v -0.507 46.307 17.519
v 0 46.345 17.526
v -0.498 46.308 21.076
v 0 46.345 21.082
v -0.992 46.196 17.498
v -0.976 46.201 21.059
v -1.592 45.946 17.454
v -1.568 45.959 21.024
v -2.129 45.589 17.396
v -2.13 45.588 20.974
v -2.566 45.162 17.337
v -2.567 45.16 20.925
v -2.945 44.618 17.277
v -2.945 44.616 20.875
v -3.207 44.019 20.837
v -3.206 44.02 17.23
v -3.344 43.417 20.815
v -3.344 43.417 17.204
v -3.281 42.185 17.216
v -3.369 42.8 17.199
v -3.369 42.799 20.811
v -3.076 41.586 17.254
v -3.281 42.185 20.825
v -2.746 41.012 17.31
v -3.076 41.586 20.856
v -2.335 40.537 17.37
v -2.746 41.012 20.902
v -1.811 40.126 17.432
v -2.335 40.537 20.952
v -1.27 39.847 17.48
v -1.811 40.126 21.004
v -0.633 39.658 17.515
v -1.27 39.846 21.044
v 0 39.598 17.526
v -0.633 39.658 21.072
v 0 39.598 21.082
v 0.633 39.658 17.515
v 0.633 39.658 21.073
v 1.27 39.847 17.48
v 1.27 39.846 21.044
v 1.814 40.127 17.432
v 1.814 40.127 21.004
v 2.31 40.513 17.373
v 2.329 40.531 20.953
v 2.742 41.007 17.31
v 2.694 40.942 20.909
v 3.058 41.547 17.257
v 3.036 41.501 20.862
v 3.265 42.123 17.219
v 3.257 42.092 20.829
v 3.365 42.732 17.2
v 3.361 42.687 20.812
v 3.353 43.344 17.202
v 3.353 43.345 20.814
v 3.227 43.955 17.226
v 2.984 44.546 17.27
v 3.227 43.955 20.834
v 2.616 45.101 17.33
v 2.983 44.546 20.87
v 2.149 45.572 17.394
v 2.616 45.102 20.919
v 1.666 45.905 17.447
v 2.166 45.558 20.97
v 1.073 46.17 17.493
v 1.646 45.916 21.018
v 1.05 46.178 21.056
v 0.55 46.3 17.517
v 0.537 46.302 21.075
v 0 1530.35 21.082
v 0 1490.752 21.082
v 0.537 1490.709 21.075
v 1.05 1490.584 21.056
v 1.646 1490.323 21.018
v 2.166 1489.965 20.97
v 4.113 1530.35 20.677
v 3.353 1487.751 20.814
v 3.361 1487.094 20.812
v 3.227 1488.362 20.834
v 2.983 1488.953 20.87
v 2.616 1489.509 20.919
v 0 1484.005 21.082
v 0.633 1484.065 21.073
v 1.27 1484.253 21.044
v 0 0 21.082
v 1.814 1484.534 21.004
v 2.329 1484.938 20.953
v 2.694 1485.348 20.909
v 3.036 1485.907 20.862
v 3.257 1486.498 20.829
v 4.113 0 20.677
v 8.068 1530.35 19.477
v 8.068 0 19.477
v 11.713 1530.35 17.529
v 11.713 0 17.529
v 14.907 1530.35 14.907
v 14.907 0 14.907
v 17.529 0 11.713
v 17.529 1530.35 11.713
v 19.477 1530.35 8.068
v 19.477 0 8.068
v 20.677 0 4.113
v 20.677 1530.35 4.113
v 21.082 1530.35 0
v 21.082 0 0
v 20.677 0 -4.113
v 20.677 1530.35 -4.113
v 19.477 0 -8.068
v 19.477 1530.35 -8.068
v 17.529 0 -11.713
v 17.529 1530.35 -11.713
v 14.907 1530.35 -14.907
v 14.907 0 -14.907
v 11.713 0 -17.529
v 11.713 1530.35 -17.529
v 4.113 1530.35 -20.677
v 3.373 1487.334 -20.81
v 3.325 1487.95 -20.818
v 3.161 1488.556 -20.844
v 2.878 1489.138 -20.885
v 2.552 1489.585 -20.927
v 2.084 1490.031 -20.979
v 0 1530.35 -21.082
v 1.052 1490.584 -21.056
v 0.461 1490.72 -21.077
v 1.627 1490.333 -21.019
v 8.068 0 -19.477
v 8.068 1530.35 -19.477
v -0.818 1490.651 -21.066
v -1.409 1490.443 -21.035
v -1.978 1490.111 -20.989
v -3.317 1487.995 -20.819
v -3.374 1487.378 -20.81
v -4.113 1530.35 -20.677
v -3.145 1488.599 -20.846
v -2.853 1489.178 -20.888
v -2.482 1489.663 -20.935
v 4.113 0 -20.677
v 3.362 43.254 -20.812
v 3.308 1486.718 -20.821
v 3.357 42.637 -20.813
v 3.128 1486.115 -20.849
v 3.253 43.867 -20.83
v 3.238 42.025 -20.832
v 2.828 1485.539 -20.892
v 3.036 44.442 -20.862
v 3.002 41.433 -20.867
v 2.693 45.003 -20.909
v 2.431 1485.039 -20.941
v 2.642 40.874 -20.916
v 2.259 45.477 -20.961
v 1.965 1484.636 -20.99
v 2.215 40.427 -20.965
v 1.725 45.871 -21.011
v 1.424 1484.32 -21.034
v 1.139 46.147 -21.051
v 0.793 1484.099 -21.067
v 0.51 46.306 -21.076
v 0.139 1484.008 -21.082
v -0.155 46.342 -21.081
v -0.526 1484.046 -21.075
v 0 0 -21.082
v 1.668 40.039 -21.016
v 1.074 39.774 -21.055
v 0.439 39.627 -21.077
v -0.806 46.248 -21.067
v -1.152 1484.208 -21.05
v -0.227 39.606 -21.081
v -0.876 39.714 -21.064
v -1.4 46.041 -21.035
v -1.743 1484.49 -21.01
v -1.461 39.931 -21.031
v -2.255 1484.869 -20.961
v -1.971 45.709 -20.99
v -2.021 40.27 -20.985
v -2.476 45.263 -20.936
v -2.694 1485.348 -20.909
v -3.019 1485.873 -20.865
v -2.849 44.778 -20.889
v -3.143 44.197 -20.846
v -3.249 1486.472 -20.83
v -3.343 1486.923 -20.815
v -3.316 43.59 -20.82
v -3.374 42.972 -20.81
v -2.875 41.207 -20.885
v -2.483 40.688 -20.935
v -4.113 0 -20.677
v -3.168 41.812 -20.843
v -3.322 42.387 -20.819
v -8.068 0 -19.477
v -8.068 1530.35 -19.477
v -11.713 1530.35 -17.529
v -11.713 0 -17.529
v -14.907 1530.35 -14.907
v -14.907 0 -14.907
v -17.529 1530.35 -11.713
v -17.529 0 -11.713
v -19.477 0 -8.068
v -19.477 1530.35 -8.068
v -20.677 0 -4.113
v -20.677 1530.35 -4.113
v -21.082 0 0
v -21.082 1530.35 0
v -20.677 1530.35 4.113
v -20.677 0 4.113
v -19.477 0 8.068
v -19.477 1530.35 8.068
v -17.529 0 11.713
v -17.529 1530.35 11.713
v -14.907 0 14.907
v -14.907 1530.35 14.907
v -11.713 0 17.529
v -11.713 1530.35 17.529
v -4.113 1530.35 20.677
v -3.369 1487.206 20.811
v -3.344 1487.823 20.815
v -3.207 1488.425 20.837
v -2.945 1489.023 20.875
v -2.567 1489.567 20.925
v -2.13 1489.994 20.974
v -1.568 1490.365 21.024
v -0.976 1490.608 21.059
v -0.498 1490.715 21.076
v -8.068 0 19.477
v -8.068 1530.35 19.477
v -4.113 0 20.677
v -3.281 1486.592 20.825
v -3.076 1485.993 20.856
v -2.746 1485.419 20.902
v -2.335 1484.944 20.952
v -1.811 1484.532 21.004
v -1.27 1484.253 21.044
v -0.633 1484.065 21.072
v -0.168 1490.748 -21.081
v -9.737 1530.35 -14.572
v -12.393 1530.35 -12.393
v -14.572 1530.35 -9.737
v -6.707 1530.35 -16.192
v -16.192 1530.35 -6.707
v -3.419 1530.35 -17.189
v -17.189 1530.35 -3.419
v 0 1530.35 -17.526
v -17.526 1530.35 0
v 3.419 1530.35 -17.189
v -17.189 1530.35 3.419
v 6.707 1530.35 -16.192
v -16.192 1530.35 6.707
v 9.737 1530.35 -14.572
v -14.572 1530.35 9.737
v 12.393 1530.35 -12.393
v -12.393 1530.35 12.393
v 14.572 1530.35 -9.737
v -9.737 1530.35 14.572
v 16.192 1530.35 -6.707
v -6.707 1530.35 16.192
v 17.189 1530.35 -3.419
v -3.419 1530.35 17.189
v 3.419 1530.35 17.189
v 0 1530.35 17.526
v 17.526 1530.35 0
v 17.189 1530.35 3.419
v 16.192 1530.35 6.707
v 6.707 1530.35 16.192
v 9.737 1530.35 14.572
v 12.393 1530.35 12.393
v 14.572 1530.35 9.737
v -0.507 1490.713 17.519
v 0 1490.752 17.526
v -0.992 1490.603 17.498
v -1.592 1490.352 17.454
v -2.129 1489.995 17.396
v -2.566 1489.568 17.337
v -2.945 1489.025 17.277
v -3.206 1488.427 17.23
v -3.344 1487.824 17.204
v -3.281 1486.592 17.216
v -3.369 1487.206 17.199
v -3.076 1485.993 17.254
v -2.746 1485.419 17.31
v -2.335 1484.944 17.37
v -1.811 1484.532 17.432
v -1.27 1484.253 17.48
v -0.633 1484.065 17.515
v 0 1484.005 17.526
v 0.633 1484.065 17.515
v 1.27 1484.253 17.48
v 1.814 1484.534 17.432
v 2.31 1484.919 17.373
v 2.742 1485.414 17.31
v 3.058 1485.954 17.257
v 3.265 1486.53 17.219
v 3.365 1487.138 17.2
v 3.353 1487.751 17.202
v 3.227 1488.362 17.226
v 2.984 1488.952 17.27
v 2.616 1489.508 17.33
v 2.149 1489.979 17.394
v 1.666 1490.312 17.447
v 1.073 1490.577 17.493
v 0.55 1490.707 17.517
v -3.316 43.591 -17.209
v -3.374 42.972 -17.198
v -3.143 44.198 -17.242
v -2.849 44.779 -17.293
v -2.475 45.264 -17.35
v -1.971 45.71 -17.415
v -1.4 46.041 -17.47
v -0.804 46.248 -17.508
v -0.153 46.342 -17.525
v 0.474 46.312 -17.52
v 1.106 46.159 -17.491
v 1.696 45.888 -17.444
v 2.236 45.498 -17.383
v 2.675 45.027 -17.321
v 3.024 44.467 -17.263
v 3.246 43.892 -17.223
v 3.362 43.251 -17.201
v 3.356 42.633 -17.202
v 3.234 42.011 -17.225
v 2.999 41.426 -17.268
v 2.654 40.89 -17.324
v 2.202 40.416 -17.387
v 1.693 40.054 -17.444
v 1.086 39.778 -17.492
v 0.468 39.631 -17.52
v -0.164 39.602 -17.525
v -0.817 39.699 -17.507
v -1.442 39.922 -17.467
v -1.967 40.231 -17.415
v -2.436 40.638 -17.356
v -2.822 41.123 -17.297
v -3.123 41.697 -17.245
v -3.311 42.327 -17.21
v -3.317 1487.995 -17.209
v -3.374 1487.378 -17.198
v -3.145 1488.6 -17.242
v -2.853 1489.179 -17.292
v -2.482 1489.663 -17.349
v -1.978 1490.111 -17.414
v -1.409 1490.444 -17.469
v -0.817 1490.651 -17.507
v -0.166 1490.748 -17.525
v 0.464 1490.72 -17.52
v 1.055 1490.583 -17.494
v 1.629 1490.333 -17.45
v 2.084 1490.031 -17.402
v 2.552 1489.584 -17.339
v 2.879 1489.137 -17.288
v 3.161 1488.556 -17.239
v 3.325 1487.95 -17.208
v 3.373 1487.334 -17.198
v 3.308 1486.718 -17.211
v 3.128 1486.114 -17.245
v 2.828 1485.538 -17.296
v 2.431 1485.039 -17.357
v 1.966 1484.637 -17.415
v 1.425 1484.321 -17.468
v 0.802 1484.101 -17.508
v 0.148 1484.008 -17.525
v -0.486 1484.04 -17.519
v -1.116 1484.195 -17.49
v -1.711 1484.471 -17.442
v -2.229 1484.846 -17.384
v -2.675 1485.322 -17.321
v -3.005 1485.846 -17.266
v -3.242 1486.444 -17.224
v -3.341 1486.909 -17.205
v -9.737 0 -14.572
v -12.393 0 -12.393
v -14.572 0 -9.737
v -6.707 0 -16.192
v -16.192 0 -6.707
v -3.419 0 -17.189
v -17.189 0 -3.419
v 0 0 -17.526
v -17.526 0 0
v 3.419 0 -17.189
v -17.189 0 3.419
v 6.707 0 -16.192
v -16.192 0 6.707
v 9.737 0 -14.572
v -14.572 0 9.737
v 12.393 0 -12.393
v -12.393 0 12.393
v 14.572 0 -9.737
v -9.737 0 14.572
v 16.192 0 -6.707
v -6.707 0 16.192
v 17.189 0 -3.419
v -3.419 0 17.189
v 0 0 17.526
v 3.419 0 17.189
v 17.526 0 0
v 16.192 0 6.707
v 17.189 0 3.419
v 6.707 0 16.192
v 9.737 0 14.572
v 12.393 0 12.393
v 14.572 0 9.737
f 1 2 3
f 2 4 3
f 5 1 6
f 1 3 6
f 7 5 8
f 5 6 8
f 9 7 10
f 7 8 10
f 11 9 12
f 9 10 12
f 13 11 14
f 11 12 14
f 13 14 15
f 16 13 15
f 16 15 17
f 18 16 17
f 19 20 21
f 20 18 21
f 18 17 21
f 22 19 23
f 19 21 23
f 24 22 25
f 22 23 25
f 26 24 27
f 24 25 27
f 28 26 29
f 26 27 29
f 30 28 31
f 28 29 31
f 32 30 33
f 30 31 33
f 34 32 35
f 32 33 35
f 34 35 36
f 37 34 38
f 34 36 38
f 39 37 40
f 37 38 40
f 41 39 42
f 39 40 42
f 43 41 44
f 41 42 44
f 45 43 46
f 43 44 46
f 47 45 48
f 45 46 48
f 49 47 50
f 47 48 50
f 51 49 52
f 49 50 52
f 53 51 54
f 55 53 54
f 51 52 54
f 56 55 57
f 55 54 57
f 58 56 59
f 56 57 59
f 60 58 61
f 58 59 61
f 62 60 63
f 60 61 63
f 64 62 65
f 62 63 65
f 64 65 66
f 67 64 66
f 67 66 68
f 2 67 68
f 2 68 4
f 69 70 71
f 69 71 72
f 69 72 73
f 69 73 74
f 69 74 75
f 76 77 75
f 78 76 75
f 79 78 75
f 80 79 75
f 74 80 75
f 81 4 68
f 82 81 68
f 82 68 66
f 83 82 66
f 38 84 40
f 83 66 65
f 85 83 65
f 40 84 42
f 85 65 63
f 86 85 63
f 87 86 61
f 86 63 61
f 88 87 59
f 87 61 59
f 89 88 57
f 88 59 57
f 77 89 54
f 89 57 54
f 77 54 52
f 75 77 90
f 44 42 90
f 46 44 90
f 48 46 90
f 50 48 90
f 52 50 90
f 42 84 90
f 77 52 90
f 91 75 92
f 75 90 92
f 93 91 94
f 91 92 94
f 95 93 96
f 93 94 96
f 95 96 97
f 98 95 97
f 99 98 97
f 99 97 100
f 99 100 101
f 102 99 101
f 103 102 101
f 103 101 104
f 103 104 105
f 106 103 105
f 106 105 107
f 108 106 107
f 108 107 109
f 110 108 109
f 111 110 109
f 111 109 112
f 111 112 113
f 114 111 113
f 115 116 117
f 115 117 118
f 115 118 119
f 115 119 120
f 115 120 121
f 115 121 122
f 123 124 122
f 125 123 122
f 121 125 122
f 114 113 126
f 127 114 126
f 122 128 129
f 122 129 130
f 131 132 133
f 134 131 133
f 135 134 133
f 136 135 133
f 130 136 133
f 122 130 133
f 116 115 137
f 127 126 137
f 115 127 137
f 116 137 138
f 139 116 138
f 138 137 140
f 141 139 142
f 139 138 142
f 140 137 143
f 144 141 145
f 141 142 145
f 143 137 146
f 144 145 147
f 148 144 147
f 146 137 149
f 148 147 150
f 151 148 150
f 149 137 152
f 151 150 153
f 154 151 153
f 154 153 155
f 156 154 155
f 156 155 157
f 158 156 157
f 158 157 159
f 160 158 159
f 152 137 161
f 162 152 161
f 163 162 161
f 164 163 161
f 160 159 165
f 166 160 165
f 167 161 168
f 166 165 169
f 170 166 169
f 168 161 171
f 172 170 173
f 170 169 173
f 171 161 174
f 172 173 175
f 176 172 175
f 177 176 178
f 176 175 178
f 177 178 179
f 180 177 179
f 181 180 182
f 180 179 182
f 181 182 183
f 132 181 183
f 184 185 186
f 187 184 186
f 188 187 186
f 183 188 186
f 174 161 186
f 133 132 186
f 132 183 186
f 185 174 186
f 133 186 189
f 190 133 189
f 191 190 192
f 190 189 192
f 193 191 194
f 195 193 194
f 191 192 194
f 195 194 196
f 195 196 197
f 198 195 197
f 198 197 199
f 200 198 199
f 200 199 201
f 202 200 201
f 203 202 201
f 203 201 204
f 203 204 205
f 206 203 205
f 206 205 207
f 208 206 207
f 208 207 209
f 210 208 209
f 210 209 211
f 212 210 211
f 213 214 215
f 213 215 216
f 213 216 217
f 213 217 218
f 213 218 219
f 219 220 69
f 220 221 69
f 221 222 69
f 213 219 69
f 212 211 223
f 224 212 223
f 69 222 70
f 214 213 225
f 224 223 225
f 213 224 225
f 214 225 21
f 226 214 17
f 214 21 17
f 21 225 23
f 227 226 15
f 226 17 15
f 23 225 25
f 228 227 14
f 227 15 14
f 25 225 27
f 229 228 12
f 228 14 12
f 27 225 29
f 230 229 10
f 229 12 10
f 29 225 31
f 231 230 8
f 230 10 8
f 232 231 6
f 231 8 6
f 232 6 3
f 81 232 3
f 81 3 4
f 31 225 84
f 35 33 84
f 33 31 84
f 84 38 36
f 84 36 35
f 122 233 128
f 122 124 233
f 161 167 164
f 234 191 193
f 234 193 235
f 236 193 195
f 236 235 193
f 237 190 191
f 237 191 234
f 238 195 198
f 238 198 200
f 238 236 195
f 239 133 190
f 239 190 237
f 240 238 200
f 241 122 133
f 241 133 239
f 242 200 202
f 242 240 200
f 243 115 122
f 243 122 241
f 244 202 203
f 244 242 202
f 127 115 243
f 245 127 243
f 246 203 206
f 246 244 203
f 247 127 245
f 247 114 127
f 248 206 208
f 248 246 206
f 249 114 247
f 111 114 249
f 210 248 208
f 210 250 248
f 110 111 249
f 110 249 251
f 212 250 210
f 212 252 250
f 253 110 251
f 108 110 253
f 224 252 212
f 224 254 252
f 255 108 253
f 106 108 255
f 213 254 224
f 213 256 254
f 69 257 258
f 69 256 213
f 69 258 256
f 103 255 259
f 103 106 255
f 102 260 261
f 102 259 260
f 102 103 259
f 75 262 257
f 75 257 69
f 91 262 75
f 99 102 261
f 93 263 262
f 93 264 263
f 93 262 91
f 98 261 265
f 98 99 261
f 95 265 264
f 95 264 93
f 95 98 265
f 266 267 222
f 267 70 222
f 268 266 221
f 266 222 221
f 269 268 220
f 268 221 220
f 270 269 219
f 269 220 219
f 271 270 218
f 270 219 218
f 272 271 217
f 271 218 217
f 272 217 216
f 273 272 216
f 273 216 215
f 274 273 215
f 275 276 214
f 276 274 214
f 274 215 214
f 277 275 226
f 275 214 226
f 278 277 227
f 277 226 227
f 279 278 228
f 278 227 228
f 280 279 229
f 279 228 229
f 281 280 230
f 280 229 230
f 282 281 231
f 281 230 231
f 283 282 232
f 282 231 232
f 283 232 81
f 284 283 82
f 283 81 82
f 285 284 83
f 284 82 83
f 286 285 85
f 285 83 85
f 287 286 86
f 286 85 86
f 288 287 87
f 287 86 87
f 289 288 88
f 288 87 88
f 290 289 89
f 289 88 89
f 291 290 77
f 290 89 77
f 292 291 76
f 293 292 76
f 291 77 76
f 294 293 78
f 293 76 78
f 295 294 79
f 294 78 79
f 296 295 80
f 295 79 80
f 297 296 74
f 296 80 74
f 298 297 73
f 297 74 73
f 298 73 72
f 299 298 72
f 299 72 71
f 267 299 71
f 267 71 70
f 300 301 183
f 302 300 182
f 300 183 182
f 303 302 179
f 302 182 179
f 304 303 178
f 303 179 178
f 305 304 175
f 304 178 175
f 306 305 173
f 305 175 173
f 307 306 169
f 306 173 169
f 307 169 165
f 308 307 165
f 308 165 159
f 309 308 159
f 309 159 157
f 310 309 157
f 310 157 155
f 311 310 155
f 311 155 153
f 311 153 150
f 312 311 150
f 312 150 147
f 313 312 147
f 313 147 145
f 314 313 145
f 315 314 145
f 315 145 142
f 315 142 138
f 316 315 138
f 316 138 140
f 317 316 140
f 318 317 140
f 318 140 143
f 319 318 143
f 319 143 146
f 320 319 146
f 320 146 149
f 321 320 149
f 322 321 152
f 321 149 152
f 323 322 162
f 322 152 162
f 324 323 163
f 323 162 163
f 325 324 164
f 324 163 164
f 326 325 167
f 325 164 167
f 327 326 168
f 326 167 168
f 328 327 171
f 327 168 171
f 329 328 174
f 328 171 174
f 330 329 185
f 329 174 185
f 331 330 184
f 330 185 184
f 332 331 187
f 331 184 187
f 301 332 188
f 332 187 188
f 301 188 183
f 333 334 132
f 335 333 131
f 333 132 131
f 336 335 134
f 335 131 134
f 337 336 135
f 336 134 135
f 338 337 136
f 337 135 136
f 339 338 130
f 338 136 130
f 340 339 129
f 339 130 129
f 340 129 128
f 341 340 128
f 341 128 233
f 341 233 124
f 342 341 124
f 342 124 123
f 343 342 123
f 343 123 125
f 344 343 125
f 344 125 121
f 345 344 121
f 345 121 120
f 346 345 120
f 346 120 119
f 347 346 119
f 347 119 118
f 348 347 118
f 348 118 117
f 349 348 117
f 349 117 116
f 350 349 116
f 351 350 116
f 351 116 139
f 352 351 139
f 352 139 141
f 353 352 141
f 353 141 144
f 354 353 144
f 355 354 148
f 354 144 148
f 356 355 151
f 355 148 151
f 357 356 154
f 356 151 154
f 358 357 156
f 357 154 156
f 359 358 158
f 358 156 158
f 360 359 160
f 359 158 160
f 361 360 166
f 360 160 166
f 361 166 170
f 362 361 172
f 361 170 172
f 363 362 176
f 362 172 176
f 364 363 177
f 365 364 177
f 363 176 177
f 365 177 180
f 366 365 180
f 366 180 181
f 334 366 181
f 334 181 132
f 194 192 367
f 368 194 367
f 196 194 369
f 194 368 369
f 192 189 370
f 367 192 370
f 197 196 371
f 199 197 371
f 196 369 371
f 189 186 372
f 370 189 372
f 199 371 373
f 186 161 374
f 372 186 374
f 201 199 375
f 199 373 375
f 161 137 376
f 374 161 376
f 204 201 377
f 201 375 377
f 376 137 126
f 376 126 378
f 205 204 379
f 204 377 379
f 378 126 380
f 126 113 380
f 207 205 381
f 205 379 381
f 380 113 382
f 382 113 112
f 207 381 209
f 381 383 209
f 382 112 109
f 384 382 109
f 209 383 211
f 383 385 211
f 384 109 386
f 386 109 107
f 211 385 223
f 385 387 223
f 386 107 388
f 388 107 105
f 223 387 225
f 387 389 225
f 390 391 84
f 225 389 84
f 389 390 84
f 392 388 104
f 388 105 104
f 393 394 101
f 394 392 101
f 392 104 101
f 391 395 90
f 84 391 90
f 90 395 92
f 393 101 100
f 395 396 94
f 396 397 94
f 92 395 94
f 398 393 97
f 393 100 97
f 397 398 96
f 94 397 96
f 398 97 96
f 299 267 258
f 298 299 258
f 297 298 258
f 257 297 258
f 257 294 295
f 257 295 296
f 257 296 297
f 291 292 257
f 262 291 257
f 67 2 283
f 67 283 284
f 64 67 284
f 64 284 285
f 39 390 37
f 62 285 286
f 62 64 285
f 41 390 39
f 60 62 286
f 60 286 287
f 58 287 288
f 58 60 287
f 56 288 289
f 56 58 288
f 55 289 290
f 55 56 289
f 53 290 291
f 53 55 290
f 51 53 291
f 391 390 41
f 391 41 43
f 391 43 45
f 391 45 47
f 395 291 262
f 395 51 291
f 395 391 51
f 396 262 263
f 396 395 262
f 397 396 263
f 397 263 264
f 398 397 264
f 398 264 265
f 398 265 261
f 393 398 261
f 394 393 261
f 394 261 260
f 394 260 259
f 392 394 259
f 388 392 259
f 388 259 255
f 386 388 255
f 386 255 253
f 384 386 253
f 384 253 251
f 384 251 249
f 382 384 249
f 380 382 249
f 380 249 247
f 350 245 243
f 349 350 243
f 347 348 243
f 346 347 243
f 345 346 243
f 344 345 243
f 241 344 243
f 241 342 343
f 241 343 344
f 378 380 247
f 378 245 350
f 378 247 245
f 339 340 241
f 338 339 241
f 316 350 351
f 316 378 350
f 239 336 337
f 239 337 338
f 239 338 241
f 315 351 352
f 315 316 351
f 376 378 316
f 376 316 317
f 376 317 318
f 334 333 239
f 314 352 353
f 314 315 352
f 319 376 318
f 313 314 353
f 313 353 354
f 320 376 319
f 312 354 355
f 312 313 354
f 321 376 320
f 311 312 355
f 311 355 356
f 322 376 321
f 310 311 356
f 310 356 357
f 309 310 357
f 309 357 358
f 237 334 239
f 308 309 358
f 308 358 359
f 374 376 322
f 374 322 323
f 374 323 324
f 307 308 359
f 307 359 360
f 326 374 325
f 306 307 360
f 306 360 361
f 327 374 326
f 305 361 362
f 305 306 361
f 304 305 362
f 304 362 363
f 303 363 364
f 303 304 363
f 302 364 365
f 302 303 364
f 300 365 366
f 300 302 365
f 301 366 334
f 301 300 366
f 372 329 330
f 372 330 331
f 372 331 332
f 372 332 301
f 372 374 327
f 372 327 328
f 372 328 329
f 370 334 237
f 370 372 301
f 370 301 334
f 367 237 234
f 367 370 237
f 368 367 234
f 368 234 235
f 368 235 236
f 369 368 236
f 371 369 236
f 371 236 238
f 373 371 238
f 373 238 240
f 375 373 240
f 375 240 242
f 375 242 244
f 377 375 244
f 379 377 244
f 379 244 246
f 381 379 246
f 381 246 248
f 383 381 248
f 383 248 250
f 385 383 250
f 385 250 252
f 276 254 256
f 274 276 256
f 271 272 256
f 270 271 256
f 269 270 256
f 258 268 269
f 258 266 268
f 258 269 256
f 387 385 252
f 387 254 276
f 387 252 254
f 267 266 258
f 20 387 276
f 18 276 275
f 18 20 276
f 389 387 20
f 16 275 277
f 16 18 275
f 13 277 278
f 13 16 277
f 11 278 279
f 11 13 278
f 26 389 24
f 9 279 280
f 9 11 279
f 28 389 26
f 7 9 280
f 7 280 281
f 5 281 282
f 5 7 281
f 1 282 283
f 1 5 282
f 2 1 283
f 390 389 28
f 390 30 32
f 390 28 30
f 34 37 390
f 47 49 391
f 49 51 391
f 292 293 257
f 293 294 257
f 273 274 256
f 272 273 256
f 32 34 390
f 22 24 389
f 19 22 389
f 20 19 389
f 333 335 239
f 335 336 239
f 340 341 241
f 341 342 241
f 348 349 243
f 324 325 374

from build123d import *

# Parameters (mm, degrees)
SKETCH1_R                                 = 21.082
SKETCH1_R_2                               = 17.526
BOSS_EXTRUDE1_DEPTH                       = 1530.35
SKETCH4_W                                 = 3.373501
SKETCH4_H                                 = 21.082
F_17_64_0_26563_DIAMETER_HOLE1_AT_2_COUNT = 2
F_17_64_0_26563_DIAMETER_HOLE1_AT_2_PITCH = 1444.40656
F_17_64_0_26563_DIAMETER_HOLE2_D          = 6.747002


with BuildPart() as part:
    # Sketch1 → Boss-Extrude1 (new body)
    with BuildSketch(Plane(origin=(0, 0, 0), x_dir=(1, 0, 0), z_dir=(0, 1, 0))):
        with Locations(Location((0, 0, 0), (0, 0, 270))):
            Circle(SKETCH1_R)
        with Locations(Location((0, 0, 0), (0, 0, 270))):
            Circle(SKETCH1_R_2, mode=Mode.SUBTRACT)
    extrude(amount=BOSS_EXTRUDE1_DEPTH)

    # Sketch4 → 17/64 (0.26563) Diameter Hole1 (revolve, cut)
    with BuildSketch(Plane(origin=(0, 42.97172, 0), x_dir=(0, 1, 0), z_dir=(1, 0, 0))):
        with Locations((1.6867505, 10.541)):
            Rectangle(SKETCH4_W, SKETCH4_H)
    f_17_64_0_26563_diameter_hole1 = revolve(axis=Axis((0, 42.97172, -6.35), (0, 0, 1)), mode=Mode.SUBTRACT)

    # 17/64 (0.26563) Diameter Hole1 at 2: 17/64 (0.26563) Diameter Hole1 ×2
    with Locations(*[(0, i * F_17_64_0_26563_DIAMETER_HOLE1_AT_2_PITCH, 0) for i in range(1, F_17_64_0_26563_DIAMETER_HOLE1_AT_2_COUNT)]):
        add(f_17_64_0_26563_diameter_hole1, mode=Mode.SUBTRACT)

    # 17/64 (0.26563) Diameter Hole2 (through all)
    with Locations(Plane.XY):
        with Locations((0, 1487.37828), (0, 42.97172)):
            Hole(F_17_64_0_26563_DIAMETER_HOLE2_D / 2)


solid = part.part
